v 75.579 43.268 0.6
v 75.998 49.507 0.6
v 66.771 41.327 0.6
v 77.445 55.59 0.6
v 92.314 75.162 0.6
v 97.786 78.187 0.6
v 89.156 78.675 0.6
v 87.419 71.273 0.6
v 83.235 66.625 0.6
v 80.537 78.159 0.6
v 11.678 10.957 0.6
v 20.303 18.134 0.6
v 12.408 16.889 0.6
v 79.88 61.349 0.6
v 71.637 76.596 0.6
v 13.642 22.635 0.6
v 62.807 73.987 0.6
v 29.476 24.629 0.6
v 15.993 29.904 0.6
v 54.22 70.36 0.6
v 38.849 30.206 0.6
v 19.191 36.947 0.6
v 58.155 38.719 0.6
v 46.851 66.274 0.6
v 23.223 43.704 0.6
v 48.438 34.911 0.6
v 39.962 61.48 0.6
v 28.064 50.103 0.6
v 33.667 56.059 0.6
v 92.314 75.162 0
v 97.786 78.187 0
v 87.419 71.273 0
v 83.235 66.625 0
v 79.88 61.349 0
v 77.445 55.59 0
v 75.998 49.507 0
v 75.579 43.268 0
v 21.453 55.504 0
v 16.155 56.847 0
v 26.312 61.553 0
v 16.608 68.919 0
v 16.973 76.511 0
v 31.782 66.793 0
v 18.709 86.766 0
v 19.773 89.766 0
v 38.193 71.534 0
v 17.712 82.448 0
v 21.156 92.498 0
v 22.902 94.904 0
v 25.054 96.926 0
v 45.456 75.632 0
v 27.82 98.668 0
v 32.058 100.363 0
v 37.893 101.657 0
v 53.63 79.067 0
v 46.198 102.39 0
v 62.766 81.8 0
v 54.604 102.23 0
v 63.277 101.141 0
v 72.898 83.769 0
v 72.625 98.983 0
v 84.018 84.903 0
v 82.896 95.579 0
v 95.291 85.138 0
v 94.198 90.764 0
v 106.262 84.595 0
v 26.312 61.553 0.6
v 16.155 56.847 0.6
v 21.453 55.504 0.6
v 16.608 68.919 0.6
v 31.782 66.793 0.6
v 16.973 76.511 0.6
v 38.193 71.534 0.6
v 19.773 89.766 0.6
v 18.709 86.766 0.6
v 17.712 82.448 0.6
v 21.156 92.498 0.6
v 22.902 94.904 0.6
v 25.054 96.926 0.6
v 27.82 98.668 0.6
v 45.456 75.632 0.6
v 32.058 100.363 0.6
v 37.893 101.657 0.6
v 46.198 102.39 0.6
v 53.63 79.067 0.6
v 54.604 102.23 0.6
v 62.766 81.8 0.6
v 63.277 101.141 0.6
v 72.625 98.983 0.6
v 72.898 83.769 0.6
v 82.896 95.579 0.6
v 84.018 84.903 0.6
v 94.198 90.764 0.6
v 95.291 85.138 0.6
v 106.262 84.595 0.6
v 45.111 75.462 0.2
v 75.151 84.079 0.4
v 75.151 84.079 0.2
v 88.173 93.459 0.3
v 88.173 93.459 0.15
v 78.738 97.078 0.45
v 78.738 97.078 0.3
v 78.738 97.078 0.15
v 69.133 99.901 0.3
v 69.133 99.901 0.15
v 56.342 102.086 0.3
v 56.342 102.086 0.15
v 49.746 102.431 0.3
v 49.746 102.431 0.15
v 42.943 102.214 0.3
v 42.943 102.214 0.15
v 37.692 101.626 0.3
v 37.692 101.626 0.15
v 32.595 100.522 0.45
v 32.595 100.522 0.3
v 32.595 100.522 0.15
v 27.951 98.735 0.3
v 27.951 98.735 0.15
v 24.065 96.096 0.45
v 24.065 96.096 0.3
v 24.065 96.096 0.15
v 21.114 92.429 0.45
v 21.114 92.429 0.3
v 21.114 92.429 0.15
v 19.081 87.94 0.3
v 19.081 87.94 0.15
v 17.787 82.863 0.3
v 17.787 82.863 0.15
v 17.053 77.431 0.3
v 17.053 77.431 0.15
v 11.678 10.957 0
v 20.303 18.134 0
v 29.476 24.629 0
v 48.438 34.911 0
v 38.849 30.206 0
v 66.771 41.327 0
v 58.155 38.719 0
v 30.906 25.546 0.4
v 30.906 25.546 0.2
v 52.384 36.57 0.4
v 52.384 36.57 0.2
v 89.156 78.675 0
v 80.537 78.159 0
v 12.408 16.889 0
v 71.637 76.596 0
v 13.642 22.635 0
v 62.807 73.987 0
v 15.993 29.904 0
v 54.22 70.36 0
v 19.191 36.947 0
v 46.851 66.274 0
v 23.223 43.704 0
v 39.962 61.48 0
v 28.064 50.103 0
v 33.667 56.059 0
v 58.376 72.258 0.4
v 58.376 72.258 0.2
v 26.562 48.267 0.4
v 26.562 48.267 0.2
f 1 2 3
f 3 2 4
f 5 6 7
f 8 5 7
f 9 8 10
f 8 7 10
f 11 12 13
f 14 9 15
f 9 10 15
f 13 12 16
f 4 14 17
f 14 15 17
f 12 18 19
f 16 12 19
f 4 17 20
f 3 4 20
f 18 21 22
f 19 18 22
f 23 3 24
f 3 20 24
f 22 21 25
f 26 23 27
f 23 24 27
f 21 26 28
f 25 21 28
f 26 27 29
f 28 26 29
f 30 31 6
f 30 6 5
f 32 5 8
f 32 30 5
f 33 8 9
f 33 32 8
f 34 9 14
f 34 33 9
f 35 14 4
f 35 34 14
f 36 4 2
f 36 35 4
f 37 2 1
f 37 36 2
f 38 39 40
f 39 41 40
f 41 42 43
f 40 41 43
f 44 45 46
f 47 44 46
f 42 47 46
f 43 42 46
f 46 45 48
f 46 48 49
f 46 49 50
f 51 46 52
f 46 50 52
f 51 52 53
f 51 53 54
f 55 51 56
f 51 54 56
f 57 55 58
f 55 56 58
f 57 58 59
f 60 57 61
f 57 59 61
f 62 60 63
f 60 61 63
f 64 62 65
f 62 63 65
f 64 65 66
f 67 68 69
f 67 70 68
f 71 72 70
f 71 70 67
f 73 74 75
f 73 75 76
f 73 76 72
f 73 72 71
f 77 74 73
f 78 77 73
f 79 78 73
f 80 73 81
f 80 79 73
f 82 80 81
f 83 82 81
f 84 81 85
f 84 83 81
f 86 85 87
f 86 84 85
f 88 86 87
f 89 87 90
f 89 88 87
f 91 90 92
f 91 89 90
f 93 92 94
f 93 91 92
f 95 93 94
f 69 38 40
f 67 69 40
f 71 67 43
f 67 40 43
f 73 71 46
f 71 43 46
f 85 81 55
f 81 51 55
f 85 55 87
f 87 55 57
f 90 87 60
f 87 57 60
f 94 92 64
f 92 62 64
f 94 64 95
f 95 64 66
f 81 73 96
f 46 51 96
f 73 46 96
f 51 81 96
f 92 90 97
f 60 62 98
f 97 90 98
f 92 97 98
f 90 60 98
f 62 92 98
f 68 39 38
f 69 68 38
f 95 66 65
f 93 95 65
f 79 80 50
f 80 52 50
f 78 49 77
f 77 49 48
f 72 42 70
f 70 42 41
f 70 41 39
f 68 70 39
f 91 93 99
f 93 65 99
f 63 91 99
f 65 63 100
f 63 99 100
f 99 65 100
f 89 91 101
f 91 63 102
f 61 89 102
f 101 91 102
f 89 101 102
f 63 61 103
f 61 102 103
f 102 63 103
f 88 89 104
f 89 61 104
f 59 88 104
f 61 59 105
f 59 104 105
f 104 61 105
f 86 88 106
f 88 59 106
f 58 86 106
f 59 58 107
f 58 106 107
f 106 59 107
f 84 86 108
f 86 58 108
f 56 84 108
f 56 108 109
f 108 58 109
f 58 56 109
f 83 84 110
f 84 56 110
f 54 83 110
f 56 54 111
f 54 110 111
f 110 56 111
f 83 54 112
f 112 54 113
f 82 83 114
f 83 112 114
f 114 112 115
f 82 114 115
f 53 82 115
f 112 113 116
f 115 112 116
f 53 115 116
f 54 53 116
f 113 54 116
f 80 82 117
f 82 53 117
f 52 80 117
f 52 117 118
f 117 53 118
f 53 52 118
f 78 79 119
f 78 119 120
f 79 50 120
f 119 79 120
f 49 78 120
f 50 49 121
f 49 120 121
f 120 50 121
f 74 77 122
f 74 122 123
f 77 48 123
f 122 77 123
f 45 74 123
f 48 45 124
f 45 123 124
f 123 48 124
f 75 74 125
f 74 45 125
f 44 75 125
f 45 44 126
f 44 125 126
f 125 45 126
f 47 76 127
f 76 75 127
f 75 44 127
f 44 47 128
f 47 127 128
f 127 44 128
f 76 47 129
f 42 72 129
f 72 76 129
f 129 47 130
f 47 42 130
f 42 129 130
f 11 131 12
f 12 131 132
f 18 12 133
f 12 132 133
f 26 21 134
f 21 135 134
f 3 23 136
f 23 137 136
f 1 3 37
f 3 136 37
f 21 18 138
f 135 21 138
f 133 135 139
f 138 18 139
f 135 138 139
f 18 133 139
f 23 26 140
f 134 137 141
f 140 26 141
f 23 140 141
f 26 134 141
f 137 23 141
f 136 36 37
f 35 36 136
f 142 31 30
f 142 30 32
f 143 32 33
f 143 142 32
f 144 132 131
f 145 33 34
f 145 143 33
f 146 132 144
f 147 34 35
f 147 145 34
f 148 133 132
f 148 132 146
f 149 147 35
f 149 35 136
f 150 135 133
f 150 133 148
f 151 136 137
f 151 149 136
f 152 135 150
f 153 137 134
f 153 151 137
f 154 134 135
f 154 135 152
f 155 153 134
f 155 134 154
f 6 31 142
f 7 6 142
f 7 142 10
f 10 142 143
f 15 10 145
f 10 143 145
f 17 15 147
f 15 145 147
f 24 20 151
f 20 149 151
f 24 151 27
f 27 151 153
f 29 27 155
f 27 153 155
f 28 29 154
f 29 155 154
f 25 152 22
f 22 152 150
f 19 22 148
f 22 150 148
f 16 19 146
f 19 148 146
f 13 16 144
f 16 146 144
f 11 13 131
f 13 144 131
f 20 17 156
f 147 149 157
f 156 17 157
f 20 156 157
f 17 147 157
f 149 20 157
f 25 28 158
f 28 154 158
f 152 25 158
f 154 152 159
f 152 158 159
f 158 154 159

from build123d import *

# Parameters (mm, degrees)
EXTRUDE_1_DEPTH   = 0.6
EXTRUDE_1_2_DEPTH = 0.6


with BuildPart() as part:
    # 草图1 → 凸台-拉伸1 (new body)
    with BuildSketch(Plane.XY):
        with BuildLine():
            Line((16.15512727, 56.846859008), (21.452955127, 55.503747721))
            add(Edge.make_bspline(
                [(21.452955127, 55.503747721), (40.149818623, 82.212281294), (76.38662472, 87.049295069), (106.262087238, 84.5949857)],
                knots=[0, 0, 0, 0, 1, 1, 1, 1], degree=3))
            add(Edge.make_bspline(
                [(106.262087238, 84.5949857), (94.642059919, 90.975800839), (73.77398567, 100.524100711), (45.73254736, 103.606241894), (13.617789334, 97.326121883), (17.25272253, 67.877391354), (16.15512727, 56.846859008)],
                knots=[0, 0, 0, 0, 0.317400285, 0.524814147, 0.681364649, 1, 1, 1, 1], degree=3))
        make_face()
    extrude(amount=EXTRUDE_1_DEPTH)


with BuildPart() as body_2:
    # 草图1 → Extrude 1 2 (new body)
    with BuildSketch(Plane.XY):
        with BuildLine():
            ThreePointArc((97.78644664, 78.187405023), (81.447664837, 64.057114443), (75.57901186, 43.268179529))
            add(Edge.make_bspline(
                [(11.678089645, 10.957223348), (29.603758399, 27.075491347), (51.702494837, 38.987024657), (75.57901186, 43.268179529)],
                knots=[0, 0, 0, 0, 1, 1, 1, 1], degree=3))
            add(Edge.make_bspline(
                [(97.78644664, 78.187405023), (57.690236829, 82.868725074), (14.984988135, 53.345872874), (11.678089645, 10.957223348)],
                knots=[0, 0, 0, 0, 1, 1, 1, 1], degree=3))
        make_face()
    extrude(amount=EXTRUDE_1_2_DEPTH)


solid = Compound([part.part, body_2.part])
